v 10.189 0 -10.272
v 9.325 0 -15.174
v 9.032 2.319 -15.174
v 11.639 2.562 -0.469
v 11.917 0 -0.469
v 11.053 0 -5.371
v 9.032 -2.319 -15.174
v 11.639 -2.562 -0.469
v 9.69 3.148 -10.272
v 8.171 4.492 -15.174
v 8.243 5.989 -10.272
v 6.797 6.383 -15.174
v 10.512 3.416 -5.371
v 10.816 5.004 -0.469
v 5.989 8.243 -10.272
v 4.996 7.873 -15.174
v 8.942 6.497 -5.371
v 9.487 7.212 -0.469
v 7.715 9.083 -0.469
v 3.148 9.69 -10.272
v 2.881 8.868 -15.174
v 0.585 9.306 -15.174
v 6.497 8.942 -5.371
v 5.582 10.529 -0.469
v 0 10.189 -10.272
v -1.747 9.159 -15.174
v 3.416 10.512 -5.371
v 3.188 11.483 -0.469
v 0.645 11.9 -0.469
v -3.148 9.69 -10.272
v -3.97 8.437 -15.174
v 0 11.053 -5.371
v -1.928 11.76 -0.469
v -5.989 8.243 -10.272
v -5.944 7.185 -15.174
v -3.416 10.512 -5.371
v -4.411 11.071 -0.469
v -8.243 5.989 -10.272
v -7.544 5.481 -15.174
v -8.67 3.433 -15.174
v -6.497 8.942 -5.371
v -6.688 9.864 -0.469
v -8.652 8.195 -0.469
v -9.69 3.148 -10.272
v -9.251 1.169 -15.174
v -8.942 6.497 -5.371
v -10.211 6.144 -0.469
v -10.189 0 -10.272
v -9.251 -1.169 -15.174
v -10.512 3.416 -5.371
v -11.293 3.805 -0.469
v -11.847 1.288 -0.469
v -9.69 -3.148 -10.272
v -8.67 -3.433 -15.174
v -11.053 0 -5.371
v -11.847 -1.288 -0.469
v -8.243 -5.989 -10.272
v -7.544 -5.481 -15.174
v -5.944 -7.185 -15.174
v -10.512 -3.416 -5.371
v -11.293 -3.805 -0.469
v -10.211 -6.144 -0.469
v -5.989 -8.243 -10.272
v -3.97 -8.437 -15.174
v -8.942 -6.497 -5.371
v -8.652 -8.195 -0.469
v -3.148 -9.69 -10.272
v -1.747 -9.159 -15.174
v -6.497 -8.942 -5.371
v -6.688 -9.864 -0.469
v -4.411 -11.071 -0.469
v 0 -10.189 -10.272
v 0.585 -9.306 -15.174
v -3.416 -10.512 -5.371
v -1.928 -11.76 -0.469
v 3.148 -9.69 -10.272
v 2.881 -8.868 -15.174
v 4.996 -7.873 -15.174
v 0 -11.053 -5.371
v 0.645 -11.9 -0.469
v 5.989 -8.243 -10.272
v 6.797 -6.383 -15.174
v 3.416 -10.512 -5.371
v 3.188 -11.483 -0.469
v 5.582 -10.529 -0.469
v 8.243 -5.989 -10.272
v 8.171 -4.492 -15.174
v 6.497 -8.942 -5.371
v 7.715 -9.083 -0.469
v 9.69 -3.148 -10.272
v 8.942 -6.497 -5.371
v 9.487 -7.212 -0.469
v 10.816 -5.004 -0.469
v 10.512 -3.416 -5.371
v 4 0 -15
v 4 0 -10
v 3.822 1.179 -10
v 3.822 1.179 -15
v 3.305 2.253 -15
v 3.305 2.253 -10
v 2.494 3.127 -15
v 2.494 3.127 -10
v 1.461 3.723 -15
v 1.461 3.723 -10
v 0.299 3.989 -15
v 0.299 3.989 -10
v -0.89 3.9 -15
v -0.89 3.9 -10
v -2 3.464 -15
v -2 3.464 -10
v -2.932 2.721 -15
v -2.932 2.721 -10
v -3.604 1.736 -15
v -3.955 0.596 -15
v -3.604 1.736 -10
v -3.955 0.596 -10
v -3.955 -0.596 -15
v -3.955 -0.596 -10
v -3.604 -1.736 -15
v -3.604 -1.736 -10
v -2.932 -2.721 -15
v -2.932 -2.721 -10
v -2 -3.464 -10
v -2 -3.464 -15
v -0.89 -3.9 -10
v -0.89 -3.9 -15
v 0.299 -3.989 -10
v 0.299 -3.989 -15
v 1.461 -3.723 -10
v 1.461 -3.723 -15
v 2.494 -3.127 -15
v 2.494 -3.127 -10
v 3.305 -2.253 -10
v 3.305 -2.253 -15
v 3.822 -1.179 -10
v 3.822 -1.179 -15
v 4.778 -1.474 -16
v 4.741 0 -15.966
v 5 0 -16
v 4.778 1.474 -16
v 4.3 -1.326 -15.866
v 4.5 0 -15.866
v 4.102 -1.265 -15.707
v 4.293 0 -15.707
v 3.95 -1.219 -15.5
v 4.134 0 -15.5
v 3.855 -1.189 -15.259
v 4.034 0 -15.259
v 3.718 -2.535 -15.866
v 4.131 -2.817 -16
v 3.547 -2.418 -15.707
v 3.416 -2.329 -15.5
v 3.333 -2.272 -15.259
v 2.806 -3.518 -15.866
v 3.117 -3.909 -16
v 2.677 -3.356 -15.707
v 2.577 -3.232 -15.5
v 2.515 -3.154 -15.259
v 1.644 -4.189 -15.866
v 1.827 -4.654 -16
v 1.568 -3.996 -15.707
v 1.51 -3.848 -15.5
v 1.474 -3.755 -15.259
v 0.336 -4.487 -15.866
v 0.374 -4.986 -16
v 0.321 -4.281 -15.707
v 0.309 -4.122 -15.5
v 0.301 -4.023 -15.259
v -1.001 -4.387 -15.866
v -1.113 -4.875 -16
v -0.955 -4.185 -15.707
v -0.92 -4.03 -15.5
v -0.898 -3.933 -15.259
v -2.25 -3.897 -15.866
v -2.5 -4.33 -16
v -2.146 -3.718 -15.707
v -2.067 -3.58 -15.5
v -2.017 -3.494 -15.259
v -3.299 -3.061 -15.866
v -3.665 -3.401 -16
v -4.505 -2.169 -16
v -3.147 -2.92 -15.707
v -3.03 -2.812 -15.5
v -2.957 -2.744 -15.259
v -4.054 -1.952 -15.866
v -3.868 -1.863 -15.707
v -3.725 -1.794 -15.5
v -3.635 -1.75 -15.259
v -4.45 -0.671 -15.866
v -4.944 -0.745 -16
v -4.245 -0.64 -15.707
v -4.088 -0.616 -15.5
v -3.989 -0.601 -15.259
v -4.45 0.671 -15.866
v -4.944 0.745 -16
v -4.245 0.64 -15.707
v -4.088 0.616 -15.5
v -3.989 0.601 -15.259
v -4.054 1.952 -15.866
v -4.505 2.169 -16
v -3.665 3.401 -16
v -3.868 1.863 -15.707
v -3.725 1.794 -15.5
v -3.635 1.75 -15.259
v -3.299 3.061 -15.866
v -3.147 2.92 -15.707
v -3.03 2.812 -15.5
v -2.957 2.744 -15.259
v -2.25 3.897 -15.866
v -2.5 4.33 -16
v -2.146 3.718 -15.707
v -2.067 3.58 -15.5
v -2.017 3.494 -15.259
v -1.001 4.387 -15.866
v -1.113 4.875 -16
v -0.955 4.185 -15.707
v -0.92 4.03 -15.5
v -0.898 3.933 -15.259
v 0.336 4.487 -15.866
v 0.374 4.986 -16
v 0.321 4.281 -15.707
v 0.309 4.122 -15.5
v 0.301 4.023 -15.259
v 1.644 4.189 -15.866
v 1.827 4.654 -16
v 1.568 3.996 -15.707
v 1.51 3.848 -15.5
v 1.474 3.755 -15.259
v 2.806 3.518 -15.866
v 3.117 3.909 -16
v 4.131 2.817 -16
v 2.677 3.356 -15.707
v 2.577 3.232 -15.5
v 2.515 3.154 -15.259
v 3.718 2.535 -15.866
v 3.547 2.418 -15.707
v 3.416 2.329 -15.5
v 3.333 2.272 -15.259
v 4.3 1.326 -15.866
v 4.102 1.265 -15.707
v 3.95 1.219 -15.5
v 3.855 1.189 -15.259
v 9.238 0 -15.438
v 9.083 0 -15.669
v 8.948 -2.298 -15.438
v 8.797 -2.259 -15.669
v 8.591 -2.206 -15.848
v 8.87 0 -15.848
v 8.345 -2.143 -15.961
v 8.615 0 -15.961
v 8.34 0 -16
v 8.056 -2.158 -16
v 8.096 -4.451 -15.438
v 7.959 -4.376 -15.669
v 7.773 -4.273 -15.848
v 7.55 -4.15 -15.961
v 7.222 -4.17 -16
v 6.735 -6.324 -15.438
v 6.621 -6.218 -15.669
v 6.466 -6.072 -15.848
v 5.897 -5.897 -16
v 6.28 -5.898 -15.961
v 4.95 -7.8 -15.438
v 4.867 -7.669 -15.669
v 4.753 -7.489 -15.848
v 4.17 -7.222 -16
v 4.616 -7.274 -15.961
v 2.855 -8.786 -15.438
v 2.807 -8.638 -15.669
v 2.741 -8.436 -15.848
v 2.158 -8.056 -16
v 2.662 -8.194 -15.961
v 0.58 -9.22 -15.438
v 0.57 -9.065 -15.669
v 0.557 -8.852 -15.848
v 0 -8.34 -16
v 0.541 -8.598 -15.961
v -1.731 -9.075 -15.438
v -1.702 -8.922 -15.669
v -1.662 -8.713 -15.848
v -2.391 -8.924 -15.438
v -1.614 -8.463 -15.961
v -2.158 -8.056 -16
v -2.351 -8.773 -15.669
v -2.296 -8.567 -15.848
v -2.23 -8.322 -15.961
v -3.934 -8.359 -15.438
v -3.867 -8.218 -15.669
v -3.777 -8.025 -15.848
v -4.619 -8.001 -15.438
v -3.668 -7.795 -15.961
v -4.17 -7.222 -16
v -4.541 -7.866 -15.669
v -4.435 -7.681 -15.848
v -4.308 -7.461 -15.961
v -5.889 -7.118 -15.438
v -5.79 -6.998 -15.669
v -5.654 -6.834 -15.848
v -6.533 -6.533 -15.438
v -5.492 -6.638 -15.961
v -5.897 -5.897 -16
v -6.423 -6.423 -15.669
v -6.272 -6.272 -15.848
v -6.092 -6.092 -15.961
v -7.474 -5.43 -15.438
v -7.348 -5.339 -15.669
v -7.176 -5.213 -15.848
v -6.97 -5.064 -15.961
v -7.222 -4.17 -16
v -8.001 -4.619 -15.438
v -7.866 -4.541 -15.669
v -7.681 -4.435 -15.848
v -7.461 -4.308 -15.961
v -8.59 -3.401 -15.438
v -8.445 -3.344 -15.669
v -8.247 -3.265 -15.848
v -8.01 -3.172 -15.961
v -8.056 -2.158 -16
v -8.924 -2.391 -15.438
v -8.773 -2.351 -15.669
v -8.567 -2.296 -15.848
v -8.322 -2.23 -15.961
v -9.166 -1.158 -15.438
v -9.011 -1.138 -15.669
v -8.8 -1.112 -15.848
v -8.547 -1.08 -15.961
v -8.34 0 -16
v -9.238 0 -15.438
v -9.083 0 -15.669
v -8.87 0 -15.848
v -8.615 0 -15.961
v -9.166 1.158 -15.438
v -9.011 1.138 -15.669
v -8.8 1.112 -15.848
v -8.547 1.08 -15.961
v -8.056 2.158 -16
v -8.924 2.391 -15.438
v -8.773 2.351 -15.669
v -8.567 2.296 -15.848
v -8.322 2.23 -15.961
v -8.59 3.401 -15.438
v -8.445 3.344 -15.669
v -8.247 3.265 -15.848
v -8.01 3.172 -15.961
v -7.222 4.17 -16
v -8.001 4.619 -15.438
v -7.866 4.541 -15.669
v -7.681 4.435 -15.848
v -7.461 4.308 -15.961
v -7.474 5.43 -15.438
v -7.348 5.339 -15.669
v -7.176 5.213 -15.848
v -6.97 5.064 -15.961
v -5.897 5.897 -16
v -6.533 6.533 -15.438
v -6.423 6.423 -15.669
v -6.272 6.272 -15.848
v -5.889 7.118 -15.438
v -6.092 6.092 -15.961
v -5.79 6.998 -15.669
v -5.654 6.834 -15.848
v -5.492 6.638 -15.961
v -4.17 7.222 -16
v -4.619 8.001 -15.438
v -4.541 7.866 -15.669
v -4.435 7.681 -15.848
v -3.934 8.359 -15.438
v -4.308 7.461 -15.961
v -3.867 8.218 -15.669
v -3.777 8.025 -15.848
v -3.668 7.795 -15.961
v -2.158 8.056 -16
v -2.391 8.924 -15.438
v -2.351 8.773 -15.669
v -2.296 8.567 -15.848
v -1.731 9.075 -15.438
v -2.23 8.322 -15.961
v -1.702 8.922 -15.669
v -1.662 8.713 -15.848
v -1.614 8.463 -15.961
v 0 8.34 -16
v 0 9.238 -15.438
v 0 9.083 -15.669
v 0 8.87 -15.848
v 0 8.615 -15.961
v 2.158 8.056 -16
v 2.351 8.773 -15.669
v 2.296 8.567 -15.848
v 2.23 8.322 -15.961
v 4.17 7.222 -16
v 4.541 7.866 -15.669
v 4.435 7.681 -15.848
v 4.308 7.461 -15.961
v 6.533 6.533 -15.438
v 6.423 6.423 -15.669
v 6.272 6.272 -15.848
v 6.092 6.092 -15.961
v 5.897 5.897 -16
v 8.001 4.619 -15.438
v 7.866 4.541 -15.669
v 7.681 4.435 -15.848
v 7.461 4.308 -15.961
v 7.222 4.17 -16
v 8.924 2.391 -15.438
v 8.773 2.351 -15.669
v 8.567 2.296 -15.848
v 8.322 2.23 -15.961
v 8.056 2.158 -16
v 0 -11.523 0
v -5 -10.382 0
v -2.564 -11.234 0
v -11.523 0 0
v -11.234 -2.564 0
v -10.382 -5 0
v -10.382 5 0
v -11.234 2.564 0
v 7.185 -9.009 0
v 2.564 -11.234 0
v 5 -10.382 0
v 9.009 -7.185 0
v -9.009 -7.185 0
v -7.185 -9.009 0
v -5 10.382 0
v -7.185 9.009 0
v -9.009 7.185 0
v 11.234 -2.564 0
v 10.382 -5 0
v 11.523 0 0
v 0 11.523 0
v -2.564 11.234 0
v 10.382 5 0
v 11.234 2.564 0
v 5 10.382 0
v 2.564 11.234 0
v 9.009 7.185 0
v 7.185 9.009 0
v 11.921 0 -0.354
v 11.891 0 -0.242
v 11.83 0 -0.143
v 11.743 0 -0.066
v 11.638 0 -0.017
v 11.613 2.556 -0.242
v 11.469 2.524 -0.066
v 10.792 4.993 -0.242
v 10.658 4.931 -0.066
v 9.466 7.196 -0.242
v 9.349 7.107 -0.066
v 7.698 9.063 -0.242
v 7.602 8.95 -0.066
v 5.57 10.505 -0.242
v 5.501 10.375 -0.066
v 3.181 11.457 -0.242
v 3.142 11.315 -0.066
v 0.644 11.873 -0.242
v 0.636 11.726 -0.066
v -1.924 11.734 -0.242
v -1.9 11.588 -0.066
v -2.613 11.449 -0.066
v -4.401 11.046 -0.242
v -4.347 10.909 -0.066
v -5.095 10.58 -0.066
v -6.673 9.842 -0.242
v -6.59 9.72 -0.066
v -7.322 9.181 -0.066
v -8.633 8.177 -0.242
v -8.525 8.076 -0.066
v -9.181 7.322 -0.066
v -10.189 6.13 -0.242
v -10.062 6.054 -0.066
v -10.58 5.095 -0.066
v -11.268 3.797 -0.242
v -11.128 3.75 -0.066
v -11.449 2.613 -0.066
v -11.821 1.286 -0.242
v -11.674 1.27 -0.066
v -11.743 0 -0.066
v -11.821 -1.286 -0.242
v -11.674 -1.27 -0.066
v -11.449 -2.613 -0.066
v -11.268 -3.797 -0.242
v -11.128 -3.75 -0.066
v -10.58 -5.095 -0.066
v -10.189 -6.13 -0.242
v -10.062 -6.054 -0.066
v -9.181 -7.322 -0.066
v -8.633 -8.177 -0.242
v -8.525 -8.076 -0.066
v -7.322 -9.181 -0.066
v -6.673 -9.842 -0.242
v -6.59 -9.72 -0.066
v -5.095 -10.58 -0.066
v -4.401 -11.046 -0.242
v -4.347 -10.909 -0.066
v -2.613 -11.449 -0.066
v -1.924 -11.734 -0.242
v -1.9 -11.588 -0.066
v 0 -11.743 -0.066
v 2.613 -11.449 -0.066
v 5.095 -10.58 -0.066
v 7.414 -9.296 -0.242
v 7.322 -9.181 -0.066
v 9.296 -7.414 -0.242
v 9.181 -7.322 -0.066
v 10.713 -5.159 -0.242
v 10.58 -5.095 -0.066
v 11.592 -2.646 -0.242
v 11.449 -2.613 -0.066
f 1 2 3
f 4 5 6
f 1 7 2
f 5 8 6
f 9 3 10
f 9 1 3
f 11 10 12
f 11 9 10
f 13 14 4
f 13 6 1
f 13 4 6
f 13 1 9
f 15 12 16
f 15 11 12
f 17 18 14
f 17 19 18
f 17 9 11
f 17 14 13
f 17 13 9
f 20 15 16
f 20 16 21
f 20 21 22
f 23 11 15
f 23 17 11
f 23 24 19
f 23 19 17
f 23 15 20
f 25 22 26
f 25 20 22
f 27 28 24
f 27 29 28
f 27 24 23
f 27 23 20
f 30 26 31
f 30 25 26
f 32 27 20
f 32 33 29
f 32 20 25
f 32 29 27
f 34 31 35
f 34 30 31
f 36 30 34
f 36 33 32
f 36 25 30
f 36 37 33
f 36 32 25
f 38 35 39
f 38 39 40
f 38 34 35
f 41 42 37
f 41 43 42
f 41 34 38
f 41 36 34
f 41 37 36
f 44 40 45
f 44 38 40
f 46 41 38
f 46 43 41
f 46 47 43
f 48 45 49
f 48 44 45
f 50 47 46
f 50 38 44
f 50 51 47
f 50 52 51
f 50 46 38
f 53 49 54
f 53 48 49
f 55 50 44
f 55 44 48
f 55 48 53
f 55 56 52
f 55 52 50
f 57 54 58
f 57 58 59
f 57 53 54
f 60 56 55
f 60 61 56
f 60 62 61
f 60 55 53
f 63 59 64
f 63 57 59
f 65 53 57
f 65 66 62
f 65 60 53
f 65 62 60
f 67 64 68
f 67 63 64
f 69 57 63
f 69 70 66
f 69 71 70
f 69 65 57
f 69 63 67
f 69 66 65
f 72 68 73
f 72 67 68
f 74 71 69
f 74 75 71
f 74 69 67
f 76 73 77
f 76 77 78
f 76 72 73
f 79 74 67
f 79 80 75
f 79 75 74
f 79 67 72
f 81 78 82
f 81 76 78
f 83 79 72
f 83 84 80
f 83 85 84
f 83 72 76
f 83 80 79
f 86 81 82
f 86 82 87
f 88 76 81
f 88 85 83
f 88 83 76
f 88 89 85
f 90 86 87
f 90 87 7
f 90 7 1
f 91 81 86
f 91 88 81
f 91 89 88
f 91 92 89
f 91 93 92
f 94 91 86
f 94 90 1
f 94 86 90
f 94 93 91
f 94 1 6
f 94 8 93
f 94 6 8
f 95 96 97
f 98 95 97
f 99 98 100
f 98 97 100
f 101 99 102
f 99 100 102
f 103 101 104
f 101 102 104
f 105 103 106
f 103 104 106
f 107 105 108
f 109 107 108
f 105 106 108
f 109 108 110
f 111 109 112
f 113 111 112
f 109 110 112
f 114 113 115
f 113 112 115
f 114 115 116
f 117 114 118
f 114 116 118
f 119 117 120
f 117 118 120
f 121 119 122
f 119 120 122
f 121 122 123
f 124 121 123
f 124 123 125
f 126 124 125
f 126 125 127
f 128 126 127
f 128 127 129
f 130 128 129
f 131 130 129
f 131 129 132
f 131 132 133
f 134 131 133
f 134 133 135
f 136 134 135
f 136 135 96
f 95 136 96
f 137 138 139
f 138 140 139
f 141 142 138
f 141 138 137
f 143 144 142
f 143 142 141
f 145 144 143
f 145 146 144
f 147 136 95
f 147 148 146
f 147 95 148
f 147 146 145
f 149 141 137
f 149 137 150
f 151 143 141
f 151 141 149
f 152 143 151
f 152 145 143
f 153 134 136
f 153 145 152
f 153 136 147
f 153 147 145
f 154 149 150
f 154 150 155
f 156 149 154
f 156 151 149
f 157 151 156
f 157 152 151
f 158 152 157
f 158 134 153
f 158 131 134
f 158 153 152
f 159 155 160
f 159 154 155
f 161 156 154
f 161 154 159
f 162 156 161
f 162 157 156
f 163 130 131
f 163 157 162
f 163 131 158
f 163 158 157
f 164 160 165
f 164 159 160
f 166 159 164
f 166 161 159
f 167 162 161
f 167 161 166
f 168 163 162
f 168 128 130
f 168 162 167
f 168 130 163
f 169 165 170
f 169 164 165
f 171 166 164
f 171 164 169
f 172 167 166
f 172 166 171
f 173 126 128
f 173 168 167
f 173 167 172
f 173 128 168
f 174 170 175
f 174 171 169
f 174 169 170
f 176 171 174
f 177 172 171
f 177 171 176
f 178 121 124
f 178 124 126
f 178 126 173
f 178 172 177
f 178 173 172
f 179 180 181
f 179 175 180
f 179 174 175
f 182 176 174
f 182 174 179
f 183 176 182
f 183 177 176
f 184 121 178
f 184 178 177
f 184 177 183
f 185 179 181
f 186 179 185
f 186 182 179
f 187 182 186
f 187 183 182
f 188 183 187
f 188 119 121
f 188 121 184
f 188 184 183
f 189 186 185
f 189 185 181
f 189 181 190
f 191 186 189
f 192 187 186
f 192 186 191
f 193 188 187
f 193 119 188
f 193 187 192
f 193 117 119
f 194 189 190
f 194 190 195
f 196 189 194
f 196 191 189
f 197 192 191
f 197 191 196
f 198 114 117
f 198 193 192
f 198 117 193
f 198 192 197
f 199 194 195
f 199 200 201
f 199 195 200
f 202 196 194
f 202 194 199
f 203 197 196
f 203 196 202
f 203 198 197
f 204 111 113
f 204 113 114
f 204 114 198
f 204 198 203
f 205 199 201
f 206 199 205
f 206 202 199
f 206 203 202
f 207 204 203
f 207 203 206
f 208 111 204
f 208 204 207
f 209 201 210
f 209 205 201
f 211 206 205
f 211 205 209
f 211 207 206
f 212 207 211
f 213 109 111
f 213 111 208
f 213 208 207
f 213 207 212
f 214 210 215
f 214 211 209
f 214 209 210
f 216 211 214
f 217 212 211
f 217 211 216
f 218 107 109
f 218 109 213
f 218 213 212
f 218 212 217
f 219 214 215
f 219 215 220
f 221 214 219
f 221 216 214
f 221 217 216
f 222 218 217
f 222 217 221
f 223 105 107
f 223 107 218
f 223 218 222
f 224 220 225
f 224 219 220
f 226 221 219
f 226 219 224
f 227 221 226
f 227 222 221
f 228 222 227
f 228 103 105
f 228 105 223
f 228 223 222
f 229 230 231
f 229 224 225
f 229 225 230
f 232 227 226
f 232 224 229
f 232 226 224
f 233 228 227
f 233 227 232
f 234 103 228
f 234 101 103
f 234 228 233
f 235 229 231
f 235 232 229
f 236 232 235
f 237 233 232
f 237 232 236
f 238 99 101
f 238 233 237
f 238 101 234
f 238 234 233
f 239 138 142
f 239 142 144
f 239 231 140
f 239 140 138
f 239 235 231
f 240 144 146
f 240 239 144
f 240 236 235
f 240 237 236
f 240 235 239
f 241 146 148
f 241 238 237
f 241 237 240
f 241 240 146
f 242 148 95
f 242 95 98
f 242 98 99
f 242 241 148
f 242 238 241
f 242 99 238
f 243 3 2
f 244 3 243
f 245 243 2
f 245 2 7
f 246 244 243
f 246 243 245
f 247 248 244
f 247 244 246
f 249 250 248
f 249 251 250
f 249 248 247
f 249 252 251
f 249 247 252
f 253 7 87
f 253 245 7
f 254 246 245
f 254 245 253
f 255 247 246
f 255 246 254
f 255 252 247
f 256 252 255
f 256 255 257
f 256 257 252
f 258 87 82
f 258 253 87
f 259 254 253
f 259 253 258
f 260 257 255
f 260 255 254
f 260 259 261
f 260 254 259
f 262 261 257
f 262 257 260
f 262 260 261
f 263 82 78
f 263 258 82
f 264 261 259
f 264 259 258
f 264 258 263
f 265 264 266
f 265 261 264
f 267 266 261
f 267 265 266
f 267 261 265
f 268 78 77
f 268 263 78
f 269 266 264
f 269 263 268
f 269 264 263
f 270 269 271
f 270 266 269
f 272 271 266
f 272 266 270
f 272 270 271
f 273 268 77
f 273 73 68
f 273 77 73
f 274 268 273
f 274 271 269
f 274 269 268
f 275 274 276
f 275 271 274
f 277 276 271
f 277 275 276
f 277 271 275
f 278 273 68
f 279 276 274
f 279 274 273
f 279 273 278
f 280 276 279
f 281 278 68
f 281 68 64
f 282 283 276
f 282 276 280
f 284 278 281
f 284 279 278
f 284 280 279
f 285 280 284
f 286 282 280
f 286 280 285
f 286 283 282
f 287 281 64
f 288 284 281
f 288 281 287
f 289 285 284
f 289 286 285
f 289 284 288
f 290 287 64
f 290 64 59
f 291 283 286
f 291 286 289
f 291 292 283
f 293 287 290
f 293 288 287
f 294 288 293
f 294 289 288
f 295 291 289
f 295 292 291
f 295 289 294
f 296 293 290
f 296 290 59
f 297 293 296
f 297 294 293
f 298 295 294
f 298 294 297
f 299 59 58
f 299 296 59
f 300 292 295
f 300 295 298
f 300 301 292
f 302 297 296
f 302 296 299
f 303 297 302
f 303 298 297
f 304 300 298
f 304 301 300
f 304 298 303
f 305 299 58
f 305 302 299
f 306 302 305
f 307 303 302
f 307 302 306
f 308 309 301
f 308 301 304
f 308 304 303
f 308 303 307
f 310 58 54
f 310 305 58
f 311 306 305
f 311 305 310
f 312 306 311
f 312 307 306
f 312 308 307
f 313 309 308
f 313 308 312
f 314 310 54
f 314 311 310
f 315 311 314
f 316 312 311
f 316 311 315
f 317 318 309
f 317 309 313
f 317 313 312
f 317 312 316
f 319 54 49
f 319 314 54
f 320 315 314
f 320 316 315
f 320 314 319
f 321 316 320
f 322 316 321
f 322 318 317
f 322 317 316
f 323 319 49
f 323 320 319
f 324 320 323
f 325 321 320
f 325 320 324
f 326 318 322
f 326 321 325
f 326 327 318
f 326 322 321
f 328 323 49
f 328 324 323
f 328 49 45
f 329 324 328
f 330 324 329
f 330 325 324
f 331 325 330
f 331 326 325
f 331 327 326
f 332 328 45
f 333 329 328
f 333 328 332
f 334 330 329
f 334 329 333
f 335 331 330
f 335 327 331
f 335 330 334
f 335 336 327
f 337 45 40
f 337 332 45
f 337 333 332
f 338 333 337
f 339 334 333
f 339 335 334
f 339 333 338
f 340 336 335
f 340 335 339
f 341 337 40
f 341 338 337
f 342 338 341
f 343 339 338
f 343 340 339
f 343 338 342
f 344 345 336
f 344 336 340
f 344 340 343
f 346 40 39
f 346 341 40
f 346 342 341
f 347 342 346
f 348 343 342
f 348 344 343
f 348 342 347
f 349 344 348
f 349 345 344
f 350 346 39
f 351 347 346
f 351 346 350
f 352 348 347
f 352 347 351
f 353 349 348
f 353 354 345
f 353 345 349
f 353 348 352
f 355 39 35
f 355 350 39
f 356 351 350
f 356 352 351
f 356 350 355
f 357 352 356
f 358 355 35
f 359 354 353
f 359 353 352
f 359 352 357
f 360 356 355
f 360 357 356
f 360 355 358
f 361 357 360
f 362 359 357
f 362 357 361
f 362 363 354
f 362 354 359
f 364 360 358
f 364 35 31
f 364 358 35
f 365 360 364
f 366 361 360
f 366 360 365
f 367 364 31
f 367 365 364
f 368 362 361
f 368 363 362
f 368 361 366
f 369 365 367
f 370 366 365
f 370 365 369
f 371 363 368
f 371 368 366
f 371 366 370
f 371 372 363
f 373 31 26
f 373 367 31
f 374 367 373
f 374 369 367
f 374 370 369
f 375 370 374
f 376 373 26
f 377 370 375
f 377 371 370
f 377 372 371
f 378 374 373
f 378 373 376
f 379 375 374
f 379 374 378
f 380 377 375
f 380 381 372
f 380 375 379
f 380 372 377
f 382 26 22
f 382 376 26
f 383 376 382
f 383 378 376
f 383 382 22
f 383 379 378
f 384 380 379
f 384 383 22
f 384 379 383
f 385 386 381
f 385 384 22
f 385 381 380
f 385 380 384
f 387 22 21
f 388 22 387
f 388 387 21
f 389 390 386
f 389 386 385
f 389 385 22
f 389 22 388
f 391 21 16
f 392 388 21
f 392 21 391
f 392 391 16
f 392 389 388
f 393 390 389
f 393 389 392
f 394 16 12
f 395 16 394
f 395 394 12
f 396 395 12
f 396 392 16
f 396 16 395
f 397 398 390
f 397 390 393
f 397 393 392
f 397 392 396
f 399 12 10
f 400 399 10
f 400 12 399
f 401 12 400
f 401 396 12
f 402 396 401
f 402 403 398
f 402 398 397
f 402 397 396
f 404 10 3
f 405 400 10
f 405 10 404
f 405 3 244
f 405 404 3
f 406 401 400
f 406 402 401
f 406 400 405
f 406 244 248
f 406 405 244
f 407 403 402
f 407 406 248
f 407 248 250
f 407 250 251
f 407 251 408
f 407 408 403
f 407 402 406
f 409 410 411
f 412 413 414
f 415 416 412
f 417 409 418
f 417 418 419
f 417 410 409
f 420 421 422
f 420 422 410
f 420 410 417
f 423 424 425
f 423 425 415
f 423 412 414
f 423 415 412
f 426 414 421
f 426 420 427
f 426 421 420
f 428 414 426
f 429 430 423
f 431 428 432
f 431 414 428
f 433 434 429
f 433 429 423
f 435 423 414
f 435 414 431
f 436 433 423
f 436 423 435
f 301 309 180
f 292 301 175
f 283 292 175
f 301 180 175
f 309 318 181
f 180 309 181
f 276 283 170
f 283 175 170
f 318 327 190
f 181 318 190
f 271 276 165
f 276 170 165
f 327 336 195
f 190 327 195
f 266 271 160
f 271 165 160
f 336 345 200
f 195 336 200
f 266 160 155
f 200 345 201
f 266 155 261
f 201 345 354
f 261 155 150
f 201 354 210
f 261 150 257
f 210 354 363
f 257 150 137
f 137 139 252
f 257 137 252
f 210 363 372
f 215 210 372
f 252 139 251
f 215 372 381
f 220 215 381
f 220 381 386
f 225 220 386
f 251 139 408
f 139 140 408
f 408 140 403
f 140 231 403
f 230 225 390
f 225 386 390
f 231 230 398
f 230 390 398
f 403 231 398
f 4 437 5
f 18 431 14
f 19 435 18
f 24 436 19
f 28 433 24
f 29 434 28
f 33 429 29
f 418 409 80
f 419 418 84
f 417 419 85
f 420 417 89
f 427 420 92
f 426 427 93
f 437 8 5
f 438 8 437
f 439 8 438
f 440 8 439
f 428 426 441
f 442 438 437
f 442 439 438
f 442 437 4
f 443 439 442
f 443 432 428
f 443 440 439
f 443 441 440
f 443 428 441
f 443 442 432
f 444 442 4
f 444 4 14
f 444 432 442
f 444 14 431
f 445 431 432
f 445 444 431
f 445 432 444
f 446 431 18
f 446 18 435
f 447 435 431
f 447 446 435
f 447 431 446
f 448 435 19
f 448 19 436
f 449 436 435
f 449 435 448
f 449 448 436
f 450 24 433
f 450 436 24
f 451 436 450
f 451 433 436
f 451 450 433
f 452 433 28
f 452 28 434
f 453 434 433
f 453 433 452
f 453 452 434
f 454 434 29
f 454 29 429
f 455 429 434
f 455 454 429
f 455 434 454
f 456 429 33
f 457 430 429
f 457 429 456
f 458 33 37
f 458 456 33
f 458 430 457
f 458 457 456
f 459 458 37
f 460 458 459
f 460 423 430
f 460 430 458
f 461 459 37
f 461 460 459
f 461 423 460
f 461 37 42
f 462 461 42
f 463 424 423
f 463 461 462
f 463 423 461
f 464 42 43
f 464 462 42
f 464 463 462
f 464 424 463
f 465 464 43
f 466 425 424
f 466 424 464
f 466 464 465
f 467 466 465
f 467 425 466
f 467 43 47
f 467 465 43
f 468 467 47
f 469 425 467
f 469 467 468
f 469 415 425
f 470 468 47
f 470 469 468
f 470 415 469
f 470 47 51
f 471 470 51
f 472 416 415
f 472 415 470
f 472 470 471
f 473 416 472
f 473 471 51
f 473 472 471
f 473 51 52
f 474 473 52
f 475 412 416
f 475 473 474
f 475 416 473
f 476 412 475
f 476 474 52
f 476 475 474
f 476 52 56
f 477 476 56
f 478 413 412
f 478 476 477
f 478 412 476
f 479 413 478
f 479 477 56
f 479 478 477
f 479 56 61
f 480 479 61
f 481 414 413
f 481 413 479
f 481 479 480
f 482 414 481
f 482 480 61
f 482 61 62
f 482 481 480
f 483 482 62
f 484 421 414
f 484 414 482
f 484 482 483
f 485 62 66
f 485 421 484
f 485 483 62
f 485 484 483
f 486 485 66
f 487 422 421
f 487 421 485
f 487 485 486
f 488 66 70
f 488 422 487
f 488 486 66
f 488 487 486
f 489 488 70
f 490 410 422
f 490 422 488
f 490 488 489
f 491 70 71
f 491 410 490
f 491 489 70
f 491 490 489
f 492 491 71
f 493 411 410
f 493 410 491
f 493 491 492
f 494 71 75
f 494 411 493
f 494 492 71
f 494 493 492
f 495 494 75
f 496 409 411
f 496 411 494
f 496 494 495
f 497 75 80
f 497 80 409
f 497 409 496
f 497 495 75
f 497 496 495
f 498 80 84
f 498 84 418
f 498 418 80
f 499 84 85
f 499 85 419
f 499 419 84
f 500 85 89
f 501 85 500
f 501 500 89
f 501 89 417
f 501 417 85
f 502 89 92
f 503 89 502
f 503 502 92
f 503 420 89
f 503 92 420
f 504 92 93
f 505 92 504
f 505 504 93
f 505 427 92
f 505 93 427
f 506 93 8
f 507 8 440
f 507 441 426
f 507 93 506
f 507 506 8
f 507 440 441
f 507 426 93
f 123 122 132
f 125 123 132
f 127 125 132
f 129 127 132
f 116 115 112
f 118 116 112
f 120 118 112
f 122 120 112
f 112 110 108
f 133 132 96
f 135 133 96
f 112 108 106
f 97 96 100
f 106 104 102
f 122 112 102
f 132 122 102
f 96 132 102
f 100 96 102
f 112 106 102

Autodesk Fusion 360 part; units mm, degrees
sketch "Skizze1" plane through (0, 0, 0) normal (0, 1, 0) x (1, 0, 0)
  line L0 (0, 0) -> (12, 0)
  line L1 (12, 0) -> (9.1788, 16)
  line L2 (9.1788, 16) -> (4, 16)
  line L3 (4, 16) -> (4, 10)
  line L4 (4, 10) -> (0, 10)
  line L5 (0, 10) -> (0, 0)
  dimension "d1" = 12
  dimension "d2" = 80
  dimension "d3" = 16
  dimension "d4" = 4
  dimension "d5" = 6
revolve "Drehen1" add sketch "Skizze1" angle 360 about axis through (0, 0, 1.75) along (0, 0, 1)
fillet "Abrundung1" radius 0.4 1 edges at (-11.1879, -4.3394, 0)
fillet "Abrundung2" radius 1 2 edges at (-3.7293, -1.4465, -16) (-8.5576, -3.3192, -16)
